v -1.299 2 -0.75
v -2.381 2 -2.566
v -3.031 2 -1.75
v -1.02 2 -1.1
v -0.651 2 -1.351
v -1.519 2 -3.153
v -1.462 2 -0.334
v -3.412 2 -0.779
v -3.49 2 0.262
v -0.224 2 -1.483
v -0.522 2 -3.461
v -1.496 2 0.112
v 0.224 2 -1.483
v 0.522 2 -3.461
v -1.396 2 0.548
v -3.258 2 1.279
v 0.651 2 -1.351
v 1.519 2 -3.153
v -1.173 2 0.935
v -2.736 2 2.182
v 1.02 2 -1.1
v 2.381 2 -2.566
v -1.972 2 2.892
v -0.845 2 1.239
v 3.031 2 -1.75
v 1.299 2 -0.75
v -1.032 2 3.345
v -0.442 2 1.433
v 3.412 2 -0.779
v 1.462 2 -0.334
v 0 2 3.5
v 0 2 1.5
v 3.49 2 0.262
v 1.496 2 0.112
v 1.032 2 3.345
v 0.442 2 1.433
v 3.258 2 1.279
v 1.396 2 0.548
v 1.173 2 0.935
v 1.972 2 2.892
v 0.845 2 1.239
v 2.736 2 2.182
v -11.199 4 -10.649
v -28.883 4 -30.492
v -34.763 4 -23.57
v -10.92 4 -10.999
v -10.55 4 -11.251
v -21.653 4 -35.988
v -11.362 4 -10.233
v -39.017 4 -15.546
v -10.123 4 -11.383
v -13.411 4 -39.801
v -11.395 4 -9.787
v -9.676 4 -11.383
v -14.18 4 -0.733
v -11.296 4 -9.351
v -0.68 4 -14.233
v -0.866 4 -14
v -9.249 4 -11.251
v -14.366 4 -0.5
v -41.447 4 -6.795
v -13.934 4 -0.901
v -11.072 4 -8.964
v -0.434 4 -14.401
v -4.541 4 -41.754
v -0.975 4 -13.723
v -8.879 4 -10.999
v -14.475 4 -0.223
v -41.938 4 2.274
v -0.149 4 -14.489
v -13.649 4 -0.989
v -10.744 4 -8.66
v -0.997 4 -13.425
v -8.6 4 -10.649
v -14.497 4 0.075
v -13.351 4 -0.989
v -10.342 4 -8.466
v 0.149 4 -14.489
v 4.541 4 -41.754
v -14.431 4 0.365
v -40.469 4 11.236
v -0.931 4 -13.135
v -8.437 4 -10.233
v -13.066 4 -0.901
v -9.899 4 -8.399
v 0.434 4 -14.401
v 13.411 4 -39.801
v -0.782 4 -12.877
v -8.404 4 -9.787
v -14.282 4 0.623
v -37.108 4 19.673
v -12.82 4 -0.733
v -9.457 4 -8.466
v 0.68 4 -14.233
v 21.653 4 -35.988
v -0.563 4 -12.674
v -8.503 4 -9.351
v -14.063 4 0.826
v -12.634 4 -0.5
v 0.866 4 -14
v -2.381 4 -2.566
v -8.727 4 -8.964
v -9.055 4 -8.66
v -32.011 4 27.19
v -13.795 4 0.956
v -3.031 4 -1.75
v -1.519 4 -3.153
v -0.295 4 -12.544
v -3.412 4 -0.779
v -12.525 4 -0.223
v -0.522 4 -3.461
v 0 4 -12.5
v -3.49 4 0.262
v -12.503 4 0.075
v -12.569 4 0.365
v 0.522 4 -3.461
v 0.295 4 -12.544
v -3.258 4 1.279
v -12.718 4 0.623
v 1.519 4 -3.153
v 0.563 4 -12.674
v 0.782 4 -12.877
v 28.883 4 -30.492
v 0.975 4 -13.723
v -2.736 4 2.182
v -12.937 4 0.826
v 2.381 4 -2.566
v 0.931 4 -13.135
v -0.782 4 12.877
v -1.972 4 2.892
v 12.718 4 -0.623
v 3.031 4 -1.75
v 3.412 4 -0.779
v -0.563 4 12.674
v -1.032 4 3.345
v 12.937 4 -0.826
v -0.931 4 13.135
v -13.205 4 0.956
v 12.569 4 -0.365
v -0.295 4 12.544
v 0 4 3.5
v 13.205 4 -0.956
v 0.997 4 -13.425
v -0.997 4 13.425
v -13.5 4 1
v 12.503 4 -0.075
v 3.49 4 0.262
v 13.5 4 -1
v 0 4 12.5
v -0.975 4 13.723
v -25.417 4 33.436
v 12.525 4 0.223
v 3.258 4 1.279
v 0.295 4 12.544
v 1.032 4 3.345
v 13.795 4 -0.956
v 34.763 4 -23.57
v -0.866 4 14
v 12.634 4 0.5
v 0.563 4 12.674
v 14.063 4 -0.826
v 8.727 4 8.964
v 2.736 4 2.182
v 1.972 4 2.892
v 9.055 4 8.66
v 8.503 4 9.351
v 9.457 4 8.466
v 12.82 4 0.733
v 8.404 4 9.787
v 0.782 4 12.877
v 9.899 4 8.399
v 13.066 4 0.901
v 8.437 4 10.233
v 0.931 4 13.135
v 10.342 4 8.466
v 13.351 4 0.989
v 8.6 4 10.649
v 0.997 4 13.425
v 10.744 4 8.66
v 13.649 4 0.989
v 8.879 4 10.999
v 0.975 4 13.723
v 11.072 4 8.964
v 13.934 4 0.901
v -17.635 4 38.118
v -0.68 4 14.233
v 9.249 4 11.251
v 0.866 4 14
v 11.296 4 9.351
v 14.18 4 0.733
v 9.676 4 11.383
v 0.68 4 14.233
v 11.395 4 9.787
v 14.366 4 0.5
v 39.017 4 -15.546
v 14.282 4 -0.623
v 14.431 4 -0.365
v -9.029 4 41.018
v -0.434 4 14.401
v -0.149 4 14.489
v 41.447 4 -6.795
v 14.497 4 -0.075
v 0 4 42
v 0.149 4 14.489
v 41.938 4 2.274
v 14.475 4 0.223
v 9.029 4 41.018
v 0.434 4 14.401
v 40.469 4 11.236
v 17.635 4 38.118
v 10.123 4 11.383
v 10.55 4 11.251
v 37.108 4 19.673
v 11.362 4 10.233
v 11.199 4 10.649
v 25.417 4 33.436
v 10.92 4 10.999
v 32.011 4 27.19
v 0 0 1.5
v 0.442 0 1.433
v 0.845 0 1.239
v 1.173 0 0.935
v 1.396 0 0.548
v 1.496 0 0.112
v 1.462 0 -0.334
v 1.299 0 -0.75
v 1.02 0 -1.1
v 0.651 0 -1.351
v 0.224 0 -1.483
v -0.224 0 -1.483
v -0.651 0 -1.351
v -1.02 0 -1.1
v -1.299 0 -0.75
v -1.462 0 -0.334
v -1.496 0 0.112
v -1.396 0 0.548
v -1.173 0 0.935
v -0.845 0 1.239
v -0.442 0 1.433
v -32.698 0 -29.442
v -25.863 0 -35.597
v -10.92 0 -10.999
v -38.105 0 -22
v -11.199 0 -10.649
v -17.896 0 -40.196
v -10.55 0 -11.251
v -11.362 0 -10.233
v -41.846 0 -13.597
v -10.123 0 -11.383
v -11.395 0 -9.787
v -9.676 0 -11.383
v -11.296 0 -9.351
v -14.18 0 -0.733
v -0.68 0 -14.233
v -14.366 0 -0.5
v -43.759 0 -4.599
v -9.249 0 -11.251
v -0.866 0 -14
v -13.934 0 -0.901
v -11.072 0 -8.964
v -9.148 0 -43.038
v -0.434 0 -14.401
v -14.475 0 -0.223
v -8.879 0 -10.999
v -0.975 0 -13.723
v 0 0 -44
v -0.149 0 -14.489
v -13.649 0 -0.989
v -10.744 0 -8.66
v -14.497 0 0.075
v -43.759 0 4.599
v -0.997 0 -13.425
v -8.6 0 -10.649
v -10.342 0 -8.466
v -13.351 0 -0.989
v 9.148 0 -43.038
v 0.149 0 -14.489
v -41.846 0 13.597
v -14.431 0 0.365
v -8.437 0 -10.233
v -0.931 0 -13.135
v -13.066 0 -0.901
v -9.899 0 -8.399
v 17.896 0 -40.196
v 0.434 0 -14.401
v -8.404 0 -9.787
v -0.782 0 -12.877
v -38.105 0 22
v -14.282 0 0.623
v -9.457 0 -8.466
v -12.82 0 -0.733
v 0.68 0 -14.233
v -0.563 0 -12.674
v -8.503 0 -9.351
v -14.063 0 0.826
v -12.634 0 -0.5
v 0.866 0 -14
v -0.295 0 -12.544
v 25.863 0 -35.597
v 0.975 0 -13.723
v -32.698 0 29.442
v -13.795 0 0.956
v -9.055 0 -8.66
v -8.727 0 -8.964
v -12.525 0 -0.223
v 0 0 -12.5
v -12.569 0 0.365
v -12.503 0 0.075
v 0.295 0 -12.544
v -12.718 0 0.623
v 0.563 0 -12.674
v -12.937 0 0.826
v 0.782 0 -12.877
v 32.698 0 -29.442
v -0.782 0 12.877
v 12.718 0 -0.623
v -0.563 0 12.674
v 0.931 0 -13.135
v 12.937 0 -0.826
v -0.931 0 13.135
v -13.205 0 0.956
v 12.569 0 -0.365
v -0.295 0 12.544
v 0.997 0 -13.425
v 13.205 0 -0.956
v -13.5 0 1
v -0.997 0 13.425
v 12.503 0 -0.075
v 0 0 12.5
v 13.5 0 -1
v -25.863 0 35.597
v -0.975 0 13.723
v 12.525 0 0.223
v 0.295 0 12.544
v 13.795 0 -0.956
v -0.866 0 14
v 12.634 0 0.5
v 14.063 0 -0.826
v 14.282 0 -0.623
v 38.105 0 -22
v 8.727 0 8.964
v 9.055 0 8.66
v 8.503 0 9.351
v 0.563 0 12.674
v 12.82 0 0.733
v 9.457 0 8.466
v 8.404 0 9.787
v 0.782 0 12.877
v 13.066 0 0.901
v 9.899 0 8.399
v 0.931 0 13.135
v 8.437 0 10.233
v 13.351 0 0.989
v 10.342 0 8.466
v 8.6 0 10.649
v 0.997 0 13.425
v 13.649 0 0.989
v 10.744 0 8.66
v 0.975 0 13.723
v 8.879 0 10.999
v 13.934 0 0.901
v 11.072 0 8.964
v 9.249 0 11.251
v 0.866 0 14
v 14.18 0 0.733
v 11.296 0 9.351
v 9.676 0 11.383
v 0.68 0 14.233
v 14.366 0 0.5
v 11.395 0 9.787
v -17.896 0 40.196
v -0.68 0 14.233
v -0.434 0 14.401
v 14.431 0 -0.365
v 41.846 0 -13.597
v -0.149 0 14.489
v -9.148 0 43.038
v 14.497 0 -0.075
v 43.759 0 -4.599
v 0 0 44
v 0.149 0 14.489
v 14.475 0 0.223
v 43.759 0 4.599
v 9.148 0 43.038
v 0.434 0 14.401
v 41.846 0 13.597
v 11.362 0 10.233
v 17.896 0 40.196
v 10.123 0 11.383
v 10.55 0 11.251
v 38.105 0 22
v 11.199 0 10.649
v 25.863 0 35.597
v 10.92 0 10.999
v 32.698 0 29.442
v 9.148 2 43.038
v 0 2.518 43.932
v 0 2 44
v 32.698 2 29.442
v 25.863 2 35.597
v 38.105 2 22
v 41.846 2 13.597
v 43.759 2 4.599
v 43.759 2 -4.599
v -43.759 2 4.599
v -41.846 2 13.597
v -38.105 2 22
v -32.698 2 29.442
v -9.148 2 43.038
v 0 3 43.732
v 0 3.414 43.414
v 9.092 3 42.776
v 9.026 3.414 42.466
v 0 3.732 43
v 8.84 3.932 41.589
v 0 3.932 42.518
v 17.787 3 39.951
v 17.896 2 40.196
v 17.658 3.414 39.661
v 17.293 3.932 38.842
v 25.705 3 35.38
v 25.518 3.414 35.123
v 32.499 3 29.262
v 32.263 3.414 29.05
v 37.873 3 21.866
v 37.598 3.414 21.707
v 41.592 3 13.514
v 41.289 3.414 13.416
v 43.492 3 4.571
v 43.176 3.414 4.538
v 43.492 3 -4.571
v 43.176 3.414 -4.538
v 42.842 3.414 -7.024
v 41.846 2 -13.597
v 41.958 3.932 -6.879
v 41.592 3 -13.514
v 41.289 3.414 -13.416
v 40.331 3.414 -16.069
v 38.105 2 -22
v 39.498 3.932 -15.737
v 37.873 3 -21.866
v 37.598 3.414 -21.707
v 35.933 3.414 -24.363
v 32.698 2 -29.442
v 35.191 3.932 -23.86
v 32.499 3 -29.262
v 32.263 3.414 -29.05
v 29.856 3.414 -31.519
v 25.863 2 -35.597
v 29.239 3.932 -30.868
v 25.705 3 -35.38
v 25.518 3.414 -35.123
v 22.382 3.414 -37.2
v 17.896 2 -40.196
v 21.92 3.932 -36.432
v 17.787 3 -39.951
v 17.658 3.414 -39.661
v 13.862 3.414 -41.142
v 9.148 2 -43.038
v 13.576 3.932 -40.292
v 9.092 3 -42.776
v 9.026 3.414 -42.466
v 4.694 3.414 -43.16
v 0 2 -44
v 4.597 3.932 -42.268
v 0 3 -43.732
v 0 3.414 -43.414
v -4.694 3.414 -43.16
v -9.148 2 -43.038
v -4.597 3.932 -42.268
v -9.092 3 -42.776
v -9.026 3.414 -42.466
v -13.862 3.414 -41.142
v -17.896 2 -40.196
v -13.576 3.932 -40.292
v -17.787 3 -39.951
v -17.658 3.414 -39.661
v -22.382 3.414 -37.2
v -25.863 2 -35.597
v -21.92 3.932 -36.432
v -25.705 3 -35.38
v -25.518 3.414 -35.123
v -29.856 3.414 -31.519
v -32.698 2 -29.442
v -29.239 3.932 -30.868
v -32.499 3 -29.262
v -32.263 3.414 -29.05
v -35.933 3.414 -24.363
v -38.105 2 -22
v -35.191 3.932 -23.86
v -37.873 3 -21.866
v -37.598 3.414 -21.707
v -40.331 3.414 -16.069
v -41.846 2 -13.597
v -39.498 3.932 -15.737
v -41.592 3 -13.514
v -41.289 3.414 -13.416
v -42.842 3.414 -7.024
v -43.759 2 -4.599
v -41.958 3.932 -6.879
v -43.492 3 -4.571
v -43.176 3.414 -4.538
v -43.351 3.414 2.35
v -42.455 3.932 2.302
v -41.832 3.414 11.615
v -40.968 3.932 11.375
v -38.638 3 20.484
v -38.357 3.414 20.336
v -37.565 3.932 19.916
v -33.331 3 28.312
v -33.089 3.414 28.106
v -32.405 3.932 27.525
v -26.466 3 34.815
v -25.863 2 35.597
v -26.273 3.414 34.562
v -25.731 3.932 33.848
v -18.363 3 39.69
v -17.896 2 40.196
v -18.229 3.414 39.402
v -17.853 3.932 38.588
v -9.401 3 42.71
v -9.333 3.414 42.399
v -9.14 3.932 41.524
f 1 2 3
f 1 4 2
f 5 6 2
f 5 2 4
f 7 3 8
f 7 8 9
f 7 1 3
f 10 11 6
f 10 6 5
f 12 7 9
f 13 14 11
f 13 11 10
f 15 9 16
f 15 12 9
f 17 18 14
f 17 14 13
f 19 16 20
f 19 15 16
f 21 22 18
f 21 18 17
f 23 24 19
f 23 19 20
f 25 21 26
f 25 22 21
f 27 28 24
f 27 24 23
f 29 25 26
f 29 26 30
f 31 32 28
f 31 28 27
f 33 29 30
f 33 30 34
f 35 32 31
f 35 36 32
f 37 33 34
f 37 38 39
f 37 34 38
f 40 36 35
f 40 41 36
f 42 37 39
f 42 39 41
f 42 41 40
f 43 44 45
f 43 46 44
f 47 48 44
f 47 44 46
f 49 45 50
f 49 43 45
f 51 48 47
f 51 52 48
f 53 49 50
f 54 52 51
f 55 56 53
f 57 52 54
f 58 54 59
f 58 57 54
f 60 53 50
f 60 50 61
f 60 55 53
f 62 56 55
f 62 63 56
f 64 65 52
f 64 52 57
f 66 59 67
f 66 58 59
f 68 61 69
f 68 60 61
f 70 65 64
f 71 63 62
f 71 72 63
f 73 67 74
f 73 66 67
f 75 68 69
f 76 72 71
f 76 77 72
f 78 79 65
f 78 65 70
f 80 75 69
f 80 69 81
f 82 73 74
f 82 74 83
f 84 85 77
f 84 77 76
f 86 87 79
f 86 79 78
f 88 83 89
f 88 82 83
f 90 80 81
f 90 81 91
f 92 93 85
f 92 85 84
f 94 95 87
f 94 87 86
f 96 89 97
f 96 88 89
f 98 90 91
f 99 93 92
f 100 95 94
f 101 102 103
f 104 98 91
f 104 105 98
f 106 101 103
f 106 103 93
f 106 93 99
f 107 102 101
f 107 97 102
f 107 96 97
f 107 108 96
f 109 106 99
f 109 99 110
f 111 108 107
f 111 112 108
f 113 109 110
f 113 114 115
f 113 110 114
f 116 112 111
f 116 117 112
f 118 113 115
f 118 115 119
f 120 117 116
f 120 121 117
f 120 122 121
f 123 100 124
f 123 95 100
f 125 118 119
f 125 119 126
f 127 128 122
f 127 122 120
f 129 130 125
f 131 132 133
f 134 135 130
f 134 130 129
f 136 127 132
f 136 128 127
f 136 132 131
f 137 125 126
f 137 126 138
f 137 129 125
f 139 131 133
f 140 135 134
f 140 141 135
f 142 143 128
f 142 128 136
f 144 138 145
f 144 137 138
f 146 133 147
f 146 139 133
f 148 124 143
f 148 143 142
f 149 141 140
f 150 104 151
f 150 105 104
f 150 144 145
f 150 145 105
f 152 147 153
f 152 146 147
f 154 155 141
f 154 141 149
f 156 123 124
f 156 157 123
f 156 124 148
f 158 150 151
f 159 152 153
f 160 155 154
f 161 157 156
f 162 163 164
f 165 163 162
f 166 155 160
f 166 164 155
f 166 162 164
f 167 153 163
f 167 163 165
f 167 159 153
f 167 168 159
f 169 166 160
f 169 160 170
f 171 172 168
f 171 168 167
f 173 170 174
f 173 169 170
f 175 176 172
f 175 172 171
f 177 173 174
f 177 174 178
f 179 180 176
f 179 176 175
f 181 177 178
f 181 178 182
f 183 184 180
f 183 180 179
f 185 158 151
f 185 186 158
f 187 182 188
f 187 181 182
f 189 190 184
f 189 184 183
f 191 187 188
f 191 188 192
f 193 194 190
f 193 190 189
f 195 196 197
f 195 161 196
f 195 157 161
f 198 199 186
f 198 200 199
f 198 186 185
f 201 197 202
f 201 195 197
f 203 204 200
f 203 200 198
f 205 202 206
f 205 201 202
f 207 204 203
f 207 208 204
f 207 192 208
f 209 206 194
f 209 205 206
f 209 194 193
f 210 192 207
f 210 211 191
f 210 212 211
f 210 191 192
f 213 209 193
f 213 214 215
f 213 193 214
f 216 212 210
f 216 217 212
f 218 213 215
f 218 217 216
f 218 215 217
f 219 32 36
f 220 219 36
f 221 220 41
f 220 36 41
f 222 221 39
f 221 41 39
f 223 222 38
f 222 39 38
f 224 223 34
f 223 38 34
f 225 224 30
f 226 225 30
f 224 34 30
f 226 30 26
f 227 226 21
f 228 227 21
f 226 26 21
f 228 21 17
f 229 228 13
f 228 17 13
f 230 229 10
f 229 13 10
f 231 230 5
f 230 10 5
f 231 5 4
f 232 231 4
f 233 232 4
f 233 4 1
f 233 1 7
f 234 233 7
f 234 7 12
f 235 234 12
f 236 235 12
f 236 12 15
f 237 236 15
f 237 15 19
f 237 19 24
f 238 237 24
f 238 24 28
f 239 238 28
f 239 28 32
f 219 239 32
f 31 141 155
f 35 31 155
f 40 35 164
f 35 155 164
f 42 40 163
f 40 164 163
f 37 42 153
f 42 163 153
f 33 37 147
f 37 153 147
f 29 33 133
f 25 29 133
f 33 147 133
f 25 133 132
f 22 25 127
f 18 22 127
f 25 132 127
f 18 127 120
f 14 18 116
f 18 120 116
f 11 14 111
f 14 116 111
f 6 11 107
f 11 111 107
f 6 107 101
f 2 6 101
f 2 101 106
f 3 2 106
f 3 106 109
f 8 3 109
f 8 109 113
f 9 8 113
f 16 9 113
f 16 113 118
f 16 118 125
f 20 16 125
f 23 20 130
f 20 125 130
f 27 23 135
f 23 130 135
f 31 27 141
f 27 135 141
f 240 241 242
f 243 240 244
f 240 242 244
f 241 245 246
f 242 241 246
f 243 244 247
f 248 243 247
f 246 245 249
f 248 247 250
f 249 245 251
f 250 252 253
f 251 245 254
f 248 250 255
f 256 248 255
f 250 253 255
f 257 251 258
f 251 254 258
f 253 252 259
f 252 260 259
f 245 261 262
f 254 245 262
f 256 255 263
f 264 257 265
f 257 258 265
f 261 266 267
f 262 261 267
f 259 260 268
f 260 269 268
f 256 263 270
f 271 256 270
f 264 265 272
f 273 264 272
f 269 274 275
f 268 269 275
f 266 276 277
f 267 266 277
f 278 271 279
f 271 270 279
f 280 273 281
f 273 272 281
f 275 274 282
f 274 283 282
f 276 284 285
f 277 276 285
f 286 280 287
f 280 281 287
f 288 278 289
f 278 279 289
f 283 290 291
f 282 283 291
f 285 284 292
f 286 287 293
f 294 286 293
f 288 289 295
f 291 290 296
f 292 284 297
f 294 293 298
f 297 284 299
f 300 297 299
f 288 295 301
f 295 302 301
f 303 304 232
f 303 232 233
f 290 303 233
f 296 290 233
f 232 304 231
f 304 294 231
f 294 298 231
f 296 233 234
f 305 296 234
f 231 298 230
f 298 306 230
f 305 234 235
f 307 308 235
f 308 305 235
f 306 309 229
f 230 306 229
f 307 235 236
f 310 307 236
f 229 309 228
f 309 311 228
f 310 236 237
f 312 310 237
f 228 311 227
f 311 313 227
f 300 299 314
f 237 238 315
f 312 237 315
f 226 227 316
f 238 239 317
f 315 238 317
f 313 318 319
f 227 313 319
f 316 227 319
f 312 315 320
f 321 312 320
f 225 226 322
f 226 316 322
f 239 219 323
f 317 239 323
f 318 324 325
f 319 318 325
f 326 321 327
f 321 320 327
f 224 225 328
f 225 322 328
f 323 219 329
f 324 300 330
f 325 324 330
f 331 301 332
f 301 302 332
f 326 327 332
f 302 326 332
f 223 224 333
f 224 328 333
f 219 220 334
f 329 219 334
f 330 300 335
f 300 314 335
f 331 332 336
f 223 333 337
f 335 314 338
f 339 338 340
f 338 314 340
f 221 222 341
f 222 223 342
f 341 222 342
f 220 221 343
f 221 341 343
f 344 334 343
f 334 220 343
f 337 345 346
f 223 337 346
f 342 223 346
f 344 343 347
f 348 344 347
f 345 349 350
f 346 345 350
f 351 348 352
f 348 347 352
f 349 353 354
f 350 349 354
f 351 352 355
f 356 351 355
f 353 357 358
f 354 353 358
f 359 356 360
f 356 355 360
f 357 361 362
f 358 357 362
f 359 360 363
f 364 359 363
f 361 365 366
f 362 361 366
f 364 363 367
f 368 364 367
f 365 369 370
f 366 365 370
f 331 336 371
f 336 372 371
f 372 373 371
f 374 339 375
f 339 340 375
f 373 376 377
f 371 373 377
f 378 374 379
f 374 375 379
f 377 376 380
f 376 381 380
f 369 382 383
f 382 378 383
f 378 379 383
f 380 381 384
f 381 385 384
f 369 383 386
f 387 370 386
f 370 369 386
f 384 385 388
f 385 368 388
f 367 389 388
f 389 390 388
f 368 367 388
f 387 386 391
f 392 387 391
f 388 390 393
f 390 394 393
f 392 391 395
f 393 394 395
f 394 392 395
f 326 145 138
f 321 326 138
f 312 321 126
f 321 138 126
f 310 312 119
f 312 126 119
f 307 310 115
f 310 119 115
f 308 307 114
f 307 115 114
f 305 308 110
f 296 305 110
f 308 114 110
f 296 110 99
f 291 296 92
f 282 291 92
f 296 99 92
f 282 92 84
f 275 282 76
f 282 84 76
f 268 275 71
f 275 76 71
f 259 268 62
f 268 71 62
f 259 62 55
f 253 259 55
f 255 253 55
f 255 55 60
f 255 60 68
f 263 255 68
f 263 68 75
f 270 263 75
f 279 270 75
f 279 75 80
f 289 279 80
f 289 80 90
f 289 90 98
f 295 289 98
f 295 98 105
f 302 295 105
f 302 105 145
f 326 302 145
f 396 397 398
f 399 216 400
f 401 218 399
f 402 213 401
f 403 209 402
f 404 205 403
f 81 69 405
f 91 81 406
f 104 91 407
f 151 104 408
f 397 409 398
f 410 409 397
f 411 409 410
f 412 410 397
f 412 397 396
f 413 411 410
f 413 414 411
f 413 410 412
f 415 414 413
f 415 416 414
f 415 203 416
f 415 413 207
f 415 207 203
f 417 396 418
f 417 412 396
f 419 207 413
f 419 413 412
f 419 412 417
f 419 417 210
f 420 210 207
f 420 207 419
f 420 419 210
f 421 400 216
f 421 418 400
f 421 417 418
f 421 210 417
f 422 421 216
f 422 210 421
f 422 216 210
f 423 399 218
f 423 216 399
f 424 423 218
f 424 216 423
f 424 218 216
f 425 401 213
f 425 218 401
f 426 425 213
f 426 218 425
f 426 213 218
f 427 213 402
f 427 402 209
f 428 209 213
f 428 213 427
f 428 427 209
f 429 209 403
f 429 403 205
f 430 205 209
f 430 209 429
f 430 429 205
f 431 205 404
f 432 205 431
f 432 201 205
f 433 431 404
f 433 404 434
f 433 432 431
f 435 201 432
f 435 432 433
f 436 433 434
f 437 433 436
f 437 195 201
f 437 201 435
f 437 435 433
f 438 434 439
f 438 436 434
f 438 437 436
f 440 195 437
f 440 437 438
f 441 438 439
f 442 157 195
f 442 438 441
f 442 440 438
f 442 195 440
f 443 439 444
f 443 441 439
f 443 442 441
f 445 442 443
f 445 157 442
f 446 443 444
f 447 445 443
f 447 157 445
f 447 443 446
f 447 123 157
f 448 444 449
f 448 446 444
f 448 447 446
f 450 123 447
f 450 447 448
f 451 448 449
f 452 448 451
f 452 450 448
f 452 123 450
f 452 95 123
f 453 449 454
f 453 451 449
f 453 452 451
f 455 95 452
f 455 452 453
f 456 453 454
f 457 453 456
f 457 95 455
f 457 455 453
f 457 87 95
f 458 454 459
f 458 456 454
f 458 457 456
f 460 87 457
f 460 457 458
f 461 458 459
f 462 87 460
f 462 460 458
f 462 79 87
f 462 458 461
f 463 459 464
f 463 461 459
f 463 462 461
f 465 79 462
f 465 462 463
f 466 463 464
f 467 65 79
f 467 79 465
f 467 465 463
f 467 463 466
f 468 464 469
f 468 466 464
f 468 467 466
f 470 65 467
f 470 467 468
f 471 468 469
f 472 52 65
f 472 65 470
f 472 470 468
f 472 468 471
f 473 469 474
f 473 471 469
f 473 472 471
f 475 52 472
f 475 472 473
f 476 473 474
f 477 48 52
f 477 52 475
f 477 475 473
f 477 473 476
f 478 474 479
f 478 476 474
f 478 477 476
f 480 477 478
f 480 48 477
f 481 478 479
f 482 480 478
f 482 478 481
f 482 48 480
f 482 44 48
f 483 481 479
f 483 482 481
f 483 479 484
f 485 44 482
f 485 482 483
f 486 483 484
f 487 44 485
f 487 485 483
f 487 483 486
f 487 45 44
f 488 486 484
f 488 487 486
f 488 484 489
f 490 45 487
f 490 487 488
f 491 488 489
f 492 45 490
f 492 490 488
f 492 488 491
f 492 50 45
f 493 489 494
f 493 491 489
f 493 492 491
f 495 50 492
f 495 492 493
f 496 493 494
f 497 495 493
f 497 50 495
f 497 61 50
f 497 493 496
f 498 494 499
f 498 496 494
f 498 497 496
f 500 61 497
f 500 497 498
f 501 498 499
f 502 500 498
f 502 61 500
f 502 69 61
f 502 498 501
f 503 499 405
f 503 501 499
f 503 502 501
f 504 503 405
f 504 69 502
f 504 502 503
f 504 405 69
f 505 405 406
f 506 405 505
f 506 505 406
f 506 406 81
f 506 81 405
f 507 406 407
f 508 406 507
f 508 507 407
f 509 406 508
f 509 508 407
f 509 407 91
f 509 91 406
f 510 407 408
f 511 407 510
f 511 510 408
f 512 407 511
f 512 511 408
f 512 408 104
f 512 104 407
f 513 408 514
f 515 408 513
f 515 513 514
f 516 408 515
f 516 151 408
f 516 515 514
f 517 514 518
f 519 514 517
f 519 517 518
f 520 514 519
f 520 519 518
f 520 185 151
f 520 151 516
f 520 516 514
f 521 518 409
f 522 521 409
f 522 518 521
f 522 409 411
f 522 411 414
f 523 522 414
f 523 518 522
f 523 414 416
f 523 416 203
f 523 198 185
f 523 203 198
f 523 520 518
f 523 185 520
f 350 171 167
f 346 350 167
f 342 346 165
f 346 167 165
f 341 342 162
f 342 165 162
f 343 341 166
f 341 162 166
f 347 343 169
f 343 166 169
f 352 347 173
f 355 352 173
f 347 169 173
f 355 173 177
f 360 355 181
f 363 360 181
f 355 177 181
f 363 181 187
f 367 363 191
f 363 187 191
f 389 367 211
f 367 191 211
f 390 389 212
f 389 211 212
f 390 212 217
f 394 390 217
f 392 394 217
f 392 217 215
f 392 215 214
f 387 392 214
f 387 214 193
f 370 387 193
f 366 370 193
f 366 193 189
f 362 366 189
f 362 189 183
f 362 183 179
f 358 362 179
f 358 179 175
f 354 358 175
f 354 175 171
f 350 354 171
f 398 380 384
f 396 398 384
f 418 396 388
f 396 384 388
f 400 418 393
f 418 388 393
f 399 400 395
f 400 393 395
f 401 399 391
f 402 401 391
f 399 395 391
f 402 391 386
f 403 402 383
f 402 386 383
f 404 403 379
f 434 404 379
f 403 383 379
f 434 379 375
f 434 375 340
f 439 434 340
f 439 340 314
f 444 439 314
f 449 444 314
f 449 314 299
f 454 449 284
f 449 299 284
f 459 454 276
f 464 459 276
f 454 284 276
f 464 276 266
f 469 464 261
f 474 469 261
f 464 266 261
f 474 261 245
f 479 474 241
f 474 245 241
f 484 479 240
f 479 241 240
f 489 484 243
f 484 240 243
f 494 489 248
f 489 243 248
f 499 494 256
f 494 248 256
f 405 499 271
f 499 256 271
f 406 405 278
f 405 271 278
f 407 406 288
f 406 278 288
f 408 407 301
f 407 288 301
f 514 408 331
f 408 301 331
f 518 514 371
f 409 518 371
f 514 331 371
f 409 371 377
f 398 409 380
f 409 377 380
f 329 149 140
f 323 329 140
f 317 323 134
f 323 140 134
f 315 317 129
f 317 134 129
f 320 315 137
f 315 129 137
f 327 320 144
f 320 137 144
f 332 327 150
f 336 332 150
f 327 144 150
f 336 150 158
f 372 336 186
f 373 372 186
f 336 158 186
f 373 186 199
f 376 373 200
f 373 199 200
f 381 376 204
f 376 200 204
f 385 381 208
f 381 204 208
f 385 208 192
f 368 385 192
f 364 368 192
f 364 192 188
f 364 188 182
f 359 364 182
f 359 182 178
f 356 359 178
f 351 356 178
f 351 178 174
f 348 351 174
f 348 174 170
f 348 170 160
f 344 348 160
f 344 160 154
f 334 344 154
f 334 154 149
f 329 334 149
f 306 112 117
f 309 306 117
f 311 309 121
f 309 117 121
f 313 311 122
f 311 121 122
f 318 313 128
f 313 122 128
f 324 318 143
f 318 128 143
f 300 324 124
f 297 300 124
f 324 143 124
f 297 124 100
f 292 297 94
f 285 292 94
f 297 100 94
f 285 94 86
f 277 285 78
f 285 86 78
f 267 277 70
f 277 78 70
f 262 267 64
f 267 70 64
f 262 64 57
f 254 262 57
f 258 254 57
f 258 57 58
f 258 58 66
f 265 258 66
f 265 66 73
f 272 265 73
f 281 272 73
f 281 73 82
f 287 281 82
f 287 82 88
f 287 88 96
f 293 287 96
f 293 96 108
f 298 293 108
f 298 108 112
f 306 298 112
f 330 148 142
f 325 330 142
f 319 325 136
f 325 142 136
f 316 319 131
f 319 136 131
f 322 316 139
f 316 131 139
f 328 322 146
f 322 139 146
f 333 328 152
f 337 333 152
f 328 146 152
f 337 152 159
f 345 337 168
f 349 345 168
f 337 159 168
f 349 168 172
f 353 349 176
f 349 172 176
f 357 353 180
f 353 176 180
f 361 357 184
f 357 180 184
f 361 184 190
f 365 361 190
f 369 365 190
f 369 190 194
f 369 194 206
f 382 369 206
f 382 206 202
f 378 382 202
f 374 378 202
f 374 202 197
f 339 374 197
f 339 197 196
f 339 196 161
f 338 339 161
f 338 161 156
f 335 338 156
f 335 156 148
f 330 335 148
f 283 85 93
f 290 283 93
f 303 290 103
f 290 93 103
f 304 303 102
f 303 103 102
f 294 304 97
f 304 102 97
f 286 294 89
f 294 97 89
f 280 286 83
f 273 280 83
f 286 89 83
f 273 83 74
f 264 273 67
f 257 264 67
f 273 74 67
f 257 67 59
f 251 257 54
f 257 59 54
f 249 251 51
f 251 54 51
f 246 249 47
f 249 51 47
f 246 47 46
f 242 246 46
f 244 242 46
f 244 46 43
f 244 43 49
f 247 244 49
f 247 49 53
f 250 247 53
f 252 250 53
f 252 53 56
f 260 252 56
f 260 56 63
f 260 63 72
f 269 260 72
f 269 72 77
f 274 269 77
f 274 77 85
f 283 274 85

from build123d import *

# Parameters (mm, degrees)
SKETCH1_R           = 44
BOSS_EXTRUDE1_DEPTH = 4
SKETCH2_R           = 3.5
CUT_EXTRUDE1_DEPTH  = 2
SKETCH3_R           = 1
CUT_EXTRUDE2_DEPTH  = 63.353829072
SKETCH5_R           = 1.5
CUT_EXTRUDE3_DEPTH  = 63.257529665
SKETCH6_R           = 1.5
CUT_EXTRUDE4_DEPTH  = 63.353829072
FILLET1_R           = 2


with BuildPart() as part:
    # Sketch1 → Boss-Extrude1 (new body)
    with BuildSketch(Plane(origin=(0, 0, 0), x_dir=(1, 0, 0), z_dir=(0, 1, 0))):
        with Locations(Location((0, 0, 0), (0, 0, 270))):
            Circle(SKETCH1_R)
    extrude(amount=BOSS_EXTRUDE1_DEPTH)

    # Sketch2 → Cut-Extrude1 (cut)
    with BuildSketch(Plane(origin=(0, 4, 0), x_dir=(1, 0, 0), z_dir=(0, 1, 0))):
        with Locations(Location((0, 0, 0), (0, 0, 270))):
            Circle(SKETCH2_R)
    extrude(amount=-CUT_EXTRUDE1_DEPTH, mode=Mode.SUBTRACT)

    # Sketch3 → Cut-Extrude2 (cut, through all)
    with BuildSketch(Plane(origin=(0, 4, 0), x_dir=(1, 0, 0), z_dir=(0, 1, 0))):
        with Locations(Location((0, 13.5, 0), (0, 0, 270))):
            Circle(SKETCH3_R)
        with Locations(Location((0, -13.5, 0), (0, 0, 90))):
            Circle(SKETCH3_R)
        with Locations(Location((-13.5, 0, 0), (0, 0, 270))):
            Circle(SKETCH3_R)
        with Locations(Location((13.5, 0, 0), (0, 0, 90))):
            Circle(SKETCH3_R)
    extrude(amount=-CUT_EXTRUDE2_DEPTH, mode=Mode.SUBTRACT)

    # Sketch5 → Cut-Extrude3 (cut, through all)
    with BuildSketch(Plane(origin=(0, 2, 0), x_dir=(1, 0, 0), z_dir=(0, 1, 0))):
        with Locations(Location((0, 0, 0), (0, 0, 270))):
            Circle(SKETCH5_R)
    extrude(amount=-CUT_EXTRUDE3_DEPTH, mode=Mode.SUBTRACT)

    # Sketch6 → Cut-Extrude4 (cut, through all)
    with BuildSketch(Plane(origin=(0, 4, 0), x_dir=(1, 0, 0), z_dir=(0, 1, 0))):
        with Locations(Location((-9.899494937, 9.899494937, 0), (0, 0, 270))):
            Circle(SKETCH6_R)
        with Locations(Location((9.899494937, -9.899494937, 0), (0, 0, 90))):
            Circle(SKETCH6_R)
    extrude(amount=-CUT_EXTRUDE4_DEPTH, mode=Mode.SUBTRACT)

    # Fillet1
    fillet1_edges = [part.edges().sort_by_distance(p)[0] for p in [
        (0, 4, -44),
    ]]
    fillet(fillet1_edges, radius=FILLET1_R)


solid = part.part
